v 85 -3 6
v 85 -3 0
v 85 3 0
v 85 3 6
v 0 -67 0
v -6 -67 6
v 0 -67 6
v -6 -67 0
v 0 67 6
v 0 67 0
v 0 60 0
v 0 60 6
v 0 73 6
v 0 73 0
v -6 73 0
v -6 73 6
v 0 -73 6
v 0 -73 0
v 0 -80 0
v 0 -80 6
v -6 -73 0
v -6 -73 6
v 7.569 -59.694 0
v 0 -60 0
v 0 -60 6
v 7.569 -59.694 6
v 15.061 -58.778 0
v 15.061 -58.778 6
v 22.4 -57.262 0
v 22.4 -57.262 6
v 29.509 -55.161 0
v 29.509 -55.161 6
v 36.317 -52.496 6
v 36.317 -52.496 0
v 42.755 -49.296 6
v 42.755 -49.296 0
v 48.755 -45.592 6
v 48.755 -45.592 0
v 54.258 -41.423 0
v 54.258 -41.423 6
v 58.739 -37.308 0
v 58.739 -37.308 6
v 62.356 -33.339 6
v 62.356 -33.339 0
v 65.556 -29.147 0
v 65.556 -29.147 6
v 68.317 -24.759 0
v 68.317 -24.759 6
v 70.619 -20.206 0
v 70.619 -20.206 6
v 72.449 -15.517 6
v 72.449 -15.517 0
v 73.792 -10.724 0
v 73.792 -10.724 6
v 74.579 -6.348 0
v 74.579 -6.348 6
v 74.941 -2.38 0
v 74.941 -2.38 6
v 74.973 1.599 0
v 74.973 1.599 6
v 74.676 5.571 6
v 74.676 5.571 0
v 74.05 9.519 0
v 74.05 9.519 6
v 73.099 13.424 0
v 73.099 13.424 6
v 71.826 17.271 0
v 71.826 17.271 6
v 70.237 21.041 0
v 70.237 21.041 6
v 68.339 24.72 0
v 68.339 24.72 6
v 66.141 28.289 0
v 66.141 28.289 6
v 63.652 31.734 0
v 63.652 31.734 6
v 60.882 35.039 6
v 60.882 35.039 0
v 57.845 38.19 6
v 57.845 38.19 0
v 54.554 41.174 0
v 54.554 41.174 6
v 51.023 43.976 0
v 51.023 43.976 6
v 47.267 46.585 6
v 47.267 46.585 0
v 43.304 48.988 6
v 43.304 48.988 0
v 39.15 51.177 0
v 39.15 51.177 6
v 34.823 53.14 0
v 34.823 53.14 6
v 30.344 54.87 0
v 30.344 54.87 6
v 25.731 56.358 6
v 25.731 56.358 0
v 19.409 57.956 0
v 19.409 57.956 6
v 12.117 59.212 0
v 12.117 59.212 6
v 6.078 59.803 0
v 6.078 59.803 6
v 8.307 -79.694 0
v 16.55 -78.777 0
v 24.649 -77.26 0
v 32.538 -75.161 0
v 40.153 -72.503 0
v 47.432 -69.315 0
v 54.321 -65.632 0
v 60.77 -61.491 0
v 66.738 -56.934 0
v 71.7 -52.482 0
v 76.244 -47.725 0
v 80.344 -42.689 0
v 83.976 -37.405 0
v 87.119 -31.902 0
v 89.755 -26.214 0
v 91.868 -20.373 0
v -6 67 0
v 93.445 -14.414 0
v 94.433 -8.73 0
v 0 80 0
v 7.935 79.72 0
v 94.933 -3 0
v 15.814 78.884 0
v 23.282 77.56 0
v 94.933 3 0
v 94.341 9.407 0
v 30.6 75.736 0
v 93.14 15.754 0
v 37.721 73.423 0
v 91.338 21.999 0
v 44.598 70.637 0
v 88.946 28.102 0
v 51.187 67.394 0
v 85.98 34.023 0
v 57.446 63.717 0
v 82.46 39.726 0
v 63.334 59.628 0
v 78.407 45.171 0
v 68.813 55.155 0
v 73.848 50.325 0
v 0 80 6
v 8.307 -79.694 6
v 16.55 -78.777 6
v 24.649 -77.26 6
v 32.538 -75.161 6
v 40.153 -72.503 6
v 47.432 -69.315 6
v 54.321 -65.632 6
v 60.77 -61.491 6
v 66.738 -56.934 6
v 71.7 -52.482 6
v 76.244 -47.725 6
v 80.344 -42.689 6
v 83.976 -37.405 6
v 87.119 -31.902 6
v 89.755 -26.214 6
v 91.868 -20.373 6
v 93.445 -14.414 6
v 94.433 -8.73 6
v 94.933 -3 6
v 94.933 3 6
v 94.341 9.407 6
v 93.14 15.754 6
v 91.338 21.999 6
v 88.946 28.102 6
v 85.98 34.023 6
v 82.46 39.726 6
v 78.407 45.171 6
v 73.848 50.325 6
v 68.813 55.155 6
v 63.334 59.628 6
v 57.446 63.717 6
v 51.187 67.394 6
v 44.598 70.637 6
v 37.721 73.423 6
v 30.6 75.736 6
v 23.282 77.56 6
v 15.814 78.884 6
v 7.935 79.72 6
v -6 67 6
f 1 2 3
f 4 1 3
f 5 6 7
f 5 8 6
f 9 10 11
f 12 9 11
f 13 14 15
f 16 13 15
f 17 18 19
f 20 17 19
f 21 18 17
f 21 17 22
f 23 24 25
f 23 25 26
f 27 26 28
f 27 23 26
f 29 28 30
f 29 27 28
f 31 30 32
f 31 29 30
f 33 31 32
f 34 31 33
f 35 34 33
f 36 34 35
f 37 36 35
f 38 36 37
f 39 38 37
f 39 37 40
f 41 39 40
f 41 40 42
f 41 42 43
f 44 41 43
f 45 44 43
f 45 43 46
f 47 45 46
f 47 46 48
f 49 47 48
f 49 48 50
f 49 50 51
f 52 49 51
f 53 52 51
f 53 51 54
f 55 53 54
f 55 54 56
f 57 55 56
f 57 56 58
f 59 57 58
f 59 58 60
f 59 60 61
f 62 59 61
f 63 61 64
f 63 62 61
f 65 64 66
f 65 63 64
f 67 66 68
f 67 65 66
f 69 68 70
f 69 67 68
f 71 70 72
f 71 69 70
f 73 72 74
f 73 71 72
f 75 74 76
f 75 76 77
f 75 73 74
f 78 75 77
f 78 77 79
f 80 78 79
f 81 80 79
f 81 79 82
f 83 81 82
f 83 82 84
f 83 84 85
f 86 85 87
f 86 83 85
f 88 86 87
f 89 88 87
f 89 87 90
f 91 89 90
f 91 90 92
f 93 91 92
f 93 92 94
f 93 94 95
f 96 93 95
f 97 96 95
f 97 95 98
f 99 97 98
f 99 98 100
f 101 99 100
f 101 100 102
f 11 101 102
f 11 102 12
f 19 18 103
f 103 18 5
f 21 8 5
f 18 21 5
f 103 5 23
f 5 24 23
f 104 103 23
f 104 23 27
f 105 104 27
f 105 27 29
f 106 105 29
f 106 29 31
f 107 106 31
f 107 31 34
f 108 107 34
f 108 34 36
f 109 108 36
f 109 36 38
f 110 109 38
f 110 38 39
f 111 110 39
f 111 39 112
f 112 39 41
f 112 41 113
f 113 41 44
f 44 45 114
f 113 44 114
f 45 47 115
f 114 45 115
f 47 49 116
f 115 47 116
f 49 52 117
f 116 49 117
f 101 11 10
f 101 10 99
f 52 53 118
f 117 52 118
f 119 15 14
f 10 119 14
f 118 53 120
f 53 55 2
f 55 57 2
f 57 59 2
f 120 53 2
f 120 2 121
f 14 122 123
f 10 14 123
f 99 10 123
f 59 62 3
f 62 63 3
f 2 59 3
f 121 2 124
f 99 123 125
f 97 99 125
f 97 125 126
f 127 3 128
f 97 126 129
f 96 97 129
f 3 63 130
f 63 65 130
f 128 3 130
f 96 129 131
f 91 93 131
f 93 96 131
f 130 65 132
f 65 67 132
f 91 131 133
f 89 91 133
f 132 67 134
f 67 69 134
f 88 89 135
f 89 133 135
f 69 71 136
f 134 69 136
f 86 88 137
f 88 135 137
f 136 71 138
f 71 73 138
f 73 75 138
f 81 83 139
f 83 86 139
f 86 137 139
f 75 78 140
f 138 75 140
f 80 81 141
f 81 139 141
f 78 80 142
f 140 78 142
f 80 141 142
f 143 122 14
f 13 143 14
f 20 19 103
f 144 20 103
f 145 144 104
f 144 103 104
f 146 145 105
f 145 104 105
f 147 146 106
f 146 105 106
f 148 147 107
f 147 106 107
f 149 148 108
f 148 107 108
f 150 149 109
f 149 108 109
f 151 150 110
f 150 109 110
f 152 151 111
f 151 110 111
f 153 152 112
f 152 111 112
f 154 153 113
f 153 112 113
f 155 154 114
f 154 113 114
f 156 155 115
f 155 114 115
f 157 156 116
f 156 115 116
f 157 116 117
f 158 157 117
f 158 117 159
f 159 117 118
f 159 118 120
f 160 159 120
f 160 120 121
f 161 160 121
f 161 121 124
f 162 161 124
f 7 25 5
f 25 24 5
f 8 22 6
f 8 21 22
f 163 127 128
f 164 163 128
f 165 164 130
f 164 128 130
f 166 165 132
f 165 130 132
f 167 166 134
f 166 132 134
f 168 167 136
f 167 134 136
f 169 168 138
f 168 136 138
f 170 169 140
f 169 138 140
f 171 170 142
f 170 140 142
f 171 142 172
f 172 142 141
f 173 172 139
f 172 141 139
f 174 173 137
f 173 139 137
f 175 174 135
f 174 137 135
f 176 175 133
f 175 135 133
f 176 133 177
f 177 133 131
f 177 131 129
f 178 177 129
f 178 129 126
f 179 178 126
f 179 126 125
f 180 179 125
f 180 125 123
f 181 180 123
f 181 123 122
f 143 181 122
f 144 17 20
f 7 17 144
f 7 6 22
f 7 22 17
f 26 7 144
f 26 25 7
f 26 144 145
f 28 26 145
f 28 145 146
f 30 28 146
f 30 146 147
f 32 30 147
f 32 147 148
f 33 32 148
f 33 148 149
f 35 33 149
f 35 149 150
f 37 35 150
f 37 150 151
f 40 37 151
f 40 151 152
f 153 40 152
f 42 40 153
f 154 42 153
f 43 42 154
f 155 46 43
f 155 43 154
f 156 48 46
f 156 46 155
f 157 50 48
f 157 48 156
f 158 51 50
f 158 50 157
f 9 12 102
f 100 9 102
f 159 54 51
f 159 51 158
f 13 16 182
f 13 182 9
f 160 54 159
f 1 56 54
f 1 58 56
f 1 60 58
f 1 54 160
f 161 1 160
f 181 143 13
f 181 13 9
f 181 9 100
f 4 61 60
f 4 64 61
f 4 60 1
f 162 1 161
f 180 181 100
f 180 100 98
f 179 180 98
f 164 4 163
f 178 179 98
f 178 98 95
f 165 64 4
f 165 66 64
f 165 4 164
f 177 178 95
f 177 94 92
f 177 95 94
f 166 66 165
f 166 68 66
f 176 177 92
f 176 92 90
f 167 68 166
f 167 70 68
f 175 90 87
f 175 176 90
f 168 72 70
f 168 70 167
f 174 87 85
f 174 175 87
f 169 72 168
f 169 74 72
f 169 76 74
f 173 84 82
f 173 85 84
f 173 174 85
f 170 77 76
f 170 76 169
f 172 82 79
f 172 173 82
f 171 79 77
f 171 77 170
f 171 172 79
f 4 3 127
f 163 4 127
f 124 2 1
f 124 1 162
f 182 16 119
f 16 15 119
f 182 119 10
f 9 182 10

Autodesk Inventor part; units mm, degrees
ref_plane "YZ Plane" through (0, 0, 0) normal (1, 0, 0) x (0, 1, 0)
ref_plane "XZ Plane" through (0, 0, 0) normal (0, 1, 0) x (-1, 0, 0)
ref_plane "XY Plane" through (0, 0, 0) normal (0, 0, 1) x (1, 0, 0)
sketch "Sketch1" plane through (0, 0, 0) normal (0, 0, 1) x (1, 0, 0)
  ellipse E0 centre (0, 0) end of major axis (95, 0) minor radius 80 (0, -80) -> (0, 80) ccw
  ellipse E1 centre (0, 0) end of major axis (75, 0) minor radius 60 (0, -60) -> (0, 60) ccw
  line L0 (0, 80) -> (0, 73)
  line L1 (0, 73) -> (-6, 73)
  line L2 (-6, 73) -> (-6, 67)
  line L3 (-6, 67) -> (0, 67)
  line L4 (0, 67) -> (0, 60)
  line L5 (75, 0) -> (95, 0) construction
  line L6 (0, -73) -> (-6, -73)
  line L7 (-6, -73) -> (-6, -67)
  line L8 (-6, -67) -> (0, -67)
  line L9 (0, -60) -> (0, -67)
  line L10 (0, -73) -> (0, -80)
  line L11 (85, -35.7275) -> (85, 35.7275) construction
  line L12 (85, -3) -> (85, 3)
  line L13 (85, 3) -> (94.9332, 3)
  line L14 (85, -3) -> (94.9332, -3)
  point P0 (85, 0)
  dimension "d0" = 80
  dimension "d2" = 75
  dimension "d3" = 60
  dimension "d4" = 95
  dimension "d6" = 6
  dimension "d7" = 6
extrude "Extrusion1" add sketch "Sketch1" along normal blind 6 contours L10 L6 L7 L8 L9 E1 L4 L3 L2 L1 L0 E0 L13 L12 L14
properties part number "Arch Rear Inner" material "Plywood, Sheathing"
